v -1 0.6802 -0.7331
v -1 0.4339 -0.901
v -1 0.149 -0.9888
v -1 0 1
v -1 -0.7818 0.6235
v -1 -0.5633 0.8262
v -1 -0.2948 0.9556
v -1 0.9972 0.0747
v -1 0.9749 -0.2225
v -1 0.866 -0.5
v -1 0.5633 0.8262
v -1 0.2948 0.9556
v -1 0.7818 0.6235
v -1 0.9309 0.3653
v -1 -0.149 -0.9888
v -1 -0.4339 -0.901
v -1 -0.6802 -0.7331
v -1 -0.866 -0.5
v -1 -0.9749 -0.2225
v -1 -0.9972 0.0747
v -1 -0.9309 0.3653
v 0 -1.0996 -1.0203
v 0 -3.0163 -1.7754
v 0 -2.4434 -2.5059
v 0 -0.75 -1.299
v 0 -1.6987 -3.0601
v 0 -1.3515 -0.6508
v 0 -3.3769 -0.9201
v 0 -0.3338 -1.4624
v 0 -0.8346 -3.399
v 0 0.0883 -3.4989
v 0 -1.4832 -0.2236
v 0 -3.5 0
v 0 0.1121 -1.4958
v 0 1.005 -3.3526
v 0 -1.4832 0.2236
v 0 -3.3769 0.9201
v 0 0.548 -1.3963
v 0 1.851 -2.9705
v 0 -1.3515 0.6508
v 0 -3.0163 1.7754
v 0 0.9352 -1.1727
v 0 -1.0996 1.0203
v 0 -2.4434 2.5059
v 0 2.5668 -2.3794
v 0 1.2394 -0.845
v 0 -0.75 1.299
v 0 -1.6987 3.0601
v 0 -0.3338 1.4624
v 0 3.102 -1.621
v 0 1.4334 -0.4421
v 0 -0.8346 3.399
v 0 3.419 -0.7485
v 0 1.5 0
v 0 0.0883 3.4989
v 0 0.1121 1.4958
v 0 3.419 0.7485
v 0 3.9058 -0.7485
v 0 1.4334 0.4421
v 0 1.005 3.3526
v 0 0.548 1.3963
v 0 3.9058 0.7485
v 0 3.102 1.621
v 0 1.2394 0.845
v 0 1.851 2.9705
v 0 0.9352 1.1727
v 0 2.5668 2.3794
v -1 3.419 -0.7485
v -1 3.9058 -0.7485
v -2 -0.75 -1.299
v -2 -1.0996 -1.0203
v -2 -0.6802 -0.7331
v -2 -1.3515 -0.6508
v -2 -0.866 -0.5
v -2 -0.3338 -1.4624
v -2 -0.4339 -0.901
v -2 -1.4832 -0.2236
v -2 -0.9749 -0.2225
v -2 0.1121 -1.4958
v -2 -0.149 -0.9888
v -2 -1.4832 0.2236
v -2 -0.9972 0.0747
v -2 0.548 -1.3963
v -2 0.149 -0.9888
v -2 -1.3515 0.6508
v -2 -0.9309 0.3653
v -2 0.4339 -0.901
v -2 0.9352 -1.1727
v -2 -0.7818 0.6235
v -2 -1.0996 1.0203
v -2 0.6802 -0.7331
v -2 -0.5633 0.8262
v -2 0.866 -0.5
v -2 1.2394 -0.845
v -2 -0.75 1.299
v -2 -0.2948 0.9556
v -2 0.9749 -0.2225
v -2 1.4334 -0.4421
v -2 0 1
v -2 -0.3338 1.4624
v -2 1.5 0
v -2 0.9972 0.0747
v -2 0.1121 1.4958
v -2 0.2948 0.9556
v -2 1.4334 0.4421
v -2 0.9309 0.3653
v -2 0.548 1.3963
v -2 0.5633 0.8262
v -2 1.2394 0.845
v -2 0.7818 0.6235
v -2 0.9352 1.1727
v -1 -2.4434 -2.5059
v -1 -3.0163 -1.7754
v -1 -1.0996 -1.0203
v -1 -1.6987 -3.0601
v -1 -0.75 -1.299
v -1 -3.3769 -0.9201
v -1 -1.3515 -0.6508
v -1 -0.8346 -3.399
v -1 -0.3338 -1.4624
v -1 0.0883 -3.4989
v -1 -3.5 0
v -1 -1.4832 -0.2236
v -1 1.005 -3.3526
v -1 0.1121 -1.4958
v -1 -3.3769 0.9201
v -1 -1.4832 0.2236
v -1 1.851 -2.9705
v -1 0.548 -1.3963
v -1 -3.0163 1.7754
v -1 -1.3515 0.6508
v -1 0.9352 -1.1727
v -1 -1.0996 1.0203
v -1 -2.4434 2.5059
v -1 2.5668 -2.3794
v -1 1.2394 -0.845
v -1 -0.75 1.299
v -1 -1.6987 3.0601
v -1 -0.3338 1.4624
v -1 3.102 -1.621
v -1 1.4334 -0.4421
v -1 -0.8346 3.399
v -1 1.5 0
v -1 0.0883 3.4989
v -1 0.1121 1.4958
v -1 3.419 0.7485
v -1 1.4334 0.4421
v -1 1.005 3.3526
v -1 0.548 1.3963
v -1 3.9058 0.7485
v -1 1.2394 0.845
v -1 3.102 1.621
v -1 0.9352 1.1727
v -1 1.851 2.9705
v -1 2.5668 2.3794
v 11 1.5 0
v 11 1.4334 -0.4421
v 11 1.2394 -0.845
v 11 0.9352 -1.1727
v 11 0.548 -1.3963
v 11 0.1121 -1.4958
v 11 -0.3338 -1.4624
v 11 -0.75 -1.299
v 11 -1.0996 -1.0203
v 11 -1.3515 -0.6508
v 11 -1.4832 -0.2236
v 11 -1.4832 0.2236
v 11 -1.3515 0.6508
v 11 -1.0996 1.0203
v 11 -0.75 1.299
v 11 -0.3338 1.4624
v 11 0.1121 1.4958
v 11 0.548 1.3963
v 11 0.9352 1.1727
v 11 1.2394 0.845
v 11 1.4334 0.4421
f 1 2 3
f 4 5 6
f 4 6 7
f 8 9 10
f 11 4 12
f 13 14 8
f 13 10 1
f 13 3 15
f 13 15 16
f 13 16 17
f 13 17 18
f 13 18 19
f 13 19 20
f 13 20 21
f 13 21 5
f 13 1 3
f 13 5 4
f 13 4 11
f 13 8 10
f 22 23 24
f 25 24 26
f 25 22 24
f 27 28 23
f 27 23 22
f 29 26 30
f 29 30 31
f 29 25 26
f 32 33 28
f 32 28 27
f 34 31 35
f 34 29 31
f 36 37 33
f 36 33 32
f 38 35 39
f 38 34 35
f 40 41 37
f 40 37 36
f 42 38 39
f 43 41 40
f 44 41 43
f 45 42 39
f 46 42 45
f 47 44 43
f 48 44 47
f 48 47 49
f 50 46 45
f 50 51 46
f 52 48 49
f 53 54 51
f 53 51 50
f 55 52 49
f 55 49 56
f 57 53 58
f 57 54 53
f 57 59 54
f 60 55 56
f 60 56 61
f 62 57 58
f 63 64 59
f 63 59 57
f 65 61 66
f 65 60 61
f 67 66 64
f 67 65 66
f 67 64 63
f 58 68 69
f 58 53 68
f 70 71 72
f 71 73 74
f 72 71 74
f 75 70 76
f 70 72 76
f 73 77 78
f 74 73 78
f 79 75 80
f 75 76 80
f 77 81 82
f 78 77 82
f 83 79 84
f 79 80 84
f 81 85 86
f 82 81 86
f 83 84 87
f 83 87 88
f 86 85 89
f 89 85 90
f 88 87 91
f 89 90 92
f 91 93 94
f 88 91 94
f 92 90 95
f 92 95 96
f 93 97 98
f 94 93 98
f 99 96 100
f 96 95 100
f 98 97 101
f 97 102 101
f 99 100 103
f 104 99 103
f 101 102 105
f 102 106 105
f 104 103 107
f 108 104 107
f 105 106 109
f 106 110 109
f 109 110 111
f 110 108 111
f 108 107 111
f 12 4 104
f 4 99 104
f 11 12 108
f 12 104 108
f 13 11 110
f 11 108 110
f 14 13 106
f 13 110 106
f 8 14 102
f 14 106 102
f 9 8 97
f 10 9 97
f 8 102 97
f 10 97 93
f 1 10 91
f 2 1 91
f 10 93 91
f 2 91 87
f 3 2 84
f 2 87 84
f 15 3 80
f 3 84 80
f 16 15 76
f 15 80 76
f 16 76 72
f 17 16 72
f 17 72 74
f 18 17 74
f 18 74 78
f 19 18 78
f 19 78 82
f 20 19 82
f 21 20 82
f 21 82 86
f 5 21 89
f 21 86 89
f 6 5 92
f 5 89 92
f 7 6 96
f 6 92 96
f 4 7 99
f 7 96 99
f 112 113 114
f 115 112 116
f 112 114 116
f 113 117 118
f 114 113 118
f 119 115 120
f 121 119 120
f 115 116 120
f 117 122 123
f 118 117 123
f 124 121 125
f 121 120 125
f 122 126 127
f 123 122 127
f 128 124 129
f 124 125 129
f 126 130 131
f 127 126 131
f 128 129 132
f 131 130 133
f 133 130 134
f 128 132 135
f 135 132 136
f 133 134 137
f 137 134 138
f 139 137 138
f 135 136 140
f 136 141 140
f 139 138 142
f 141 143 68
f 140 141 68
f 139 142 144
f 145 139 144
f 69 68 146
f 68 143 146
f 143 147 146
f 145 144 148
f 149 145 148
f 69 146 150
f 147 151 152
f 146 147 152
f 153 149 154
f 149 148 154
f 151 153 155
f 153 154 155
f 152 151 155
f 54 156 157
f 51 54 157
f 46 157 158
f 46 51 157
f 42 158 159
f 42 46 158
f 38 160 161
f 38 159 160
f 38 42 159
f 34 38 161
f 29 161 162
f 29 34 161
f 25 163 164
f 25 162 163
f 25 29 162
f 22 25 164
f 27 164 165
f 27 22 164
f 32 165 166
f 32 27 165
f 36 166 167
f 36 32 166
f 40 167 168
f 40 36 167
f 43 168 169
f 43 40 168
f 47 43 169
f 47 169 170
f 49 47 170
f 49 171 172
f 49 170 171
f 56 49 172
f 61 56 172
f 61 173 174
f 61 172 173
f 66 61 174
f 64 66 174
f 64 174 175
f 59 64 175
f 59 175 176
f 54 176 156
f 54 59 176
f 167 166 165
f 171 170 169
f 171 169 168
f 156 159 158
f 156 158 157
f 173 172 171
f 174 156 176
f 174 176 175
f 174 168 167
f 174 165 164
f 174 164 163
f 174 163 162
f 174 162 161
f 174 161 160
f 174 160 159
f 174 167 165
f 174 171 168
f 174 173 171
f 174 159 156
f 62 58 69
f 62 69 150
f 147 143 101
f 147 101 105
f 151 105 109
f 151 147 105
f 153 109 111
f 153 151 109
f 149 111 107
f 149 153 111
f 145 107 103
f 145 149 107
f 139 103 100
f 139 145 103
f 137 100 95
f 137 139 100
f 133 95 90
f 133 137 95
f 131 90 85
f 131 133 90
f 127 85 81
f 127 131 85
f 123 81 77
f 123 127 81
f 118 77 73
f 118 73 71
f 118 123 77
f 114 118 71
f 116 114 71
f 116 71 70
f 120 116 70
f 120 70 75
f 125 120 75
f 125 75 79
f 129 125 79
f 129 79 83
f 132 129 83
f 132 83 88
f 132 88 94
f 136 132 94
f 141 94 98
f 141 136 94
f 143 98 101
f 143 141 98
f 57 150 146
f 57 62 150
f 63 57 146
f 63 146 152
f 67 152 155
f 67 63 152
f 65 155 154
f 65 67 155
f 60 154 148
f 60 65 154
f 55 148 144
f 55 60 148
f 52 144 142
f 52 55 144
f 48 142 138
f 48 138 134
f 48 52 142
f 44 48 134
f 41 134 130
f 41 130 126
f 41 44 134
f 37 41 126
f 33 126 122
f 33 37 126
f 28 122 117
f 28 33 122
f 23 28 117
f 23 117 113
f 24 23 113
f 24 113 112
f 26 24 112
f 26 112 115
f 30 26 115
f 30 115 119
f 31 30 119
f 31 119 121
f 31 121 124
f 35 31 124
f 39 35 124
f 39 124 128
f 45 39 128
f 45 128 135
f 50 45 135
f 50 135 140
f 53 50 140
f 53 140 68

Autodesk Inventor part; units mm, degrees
ref_plane "YZ Plane" through (0, 0, 0) normal (1, 0, 0) x (0, 1, 0)
ref_plane "XZ Plane" through (0, 0, 0) normal (0, 1, 0) x (-1, 0, 0)
ref_plane "XY Plane" through (0, 0, 0) normal (0, 0, 1) x (1, 0, 0)
sketch "Sketch1" plane through (0, 0, 0) normal (1, 0, 0) x (0, 1, 0)
  circle A0 centre (0, 0) radius 1.5
  circle A1 centre (0, 0) radius 3.5
  circle A2 centre (0, 0) radius 1.5
  line L0 (3.419, -0.7485) -> (3.9058, -0.7485)
  line L1 (3.9058, -0.7485) -> (3.9058, 0.7485)
  line L2 (3.9058, 0.7485) -> (3.419, 0.7485)
  line L3 (3.0942, -0.7485) -> (3.9058, 0.7485) construction
  line L4 (3.9058, -0.7485) -> (3.0942, 0.7485) construction
  point P0 (3.5, 0)
  dimension "d0" = 3
  dimension "d1" = 7
  dimension "d13" = 1.497
  dimension "d16" = 3
extrude "Extrusion1" add sketch "Sketch1" along normal blind 11 contours A0
extrude "Extrusion2" add sketch "Sketch1" against normal blind 1 contours A0 | A1
sketch "Sketch2" plane through (-1, 0, 0) normal (-1, 0, 0) x (0, 0, 1)
  point P0 (0, 0)
extrude "Extrusion3" add sketch "Sketch1" against normal blind 2 contours A0
sketch "Sketch3" plane through (-2, 0, 0) normal (-1, 0, 0) x (0, 0, 1)
  circle A0 centre (0, 0) radius 1
  dimension "d10" = 2
extrude "Extrusion4" cut sketch "Sketch3" against normal blind 1
extrude "Extrusion5" add sketch "Sketch1" against normal blind 1 contours A1 L2 L1 L0
properties material "Nickel-Copper Alloy 400"
